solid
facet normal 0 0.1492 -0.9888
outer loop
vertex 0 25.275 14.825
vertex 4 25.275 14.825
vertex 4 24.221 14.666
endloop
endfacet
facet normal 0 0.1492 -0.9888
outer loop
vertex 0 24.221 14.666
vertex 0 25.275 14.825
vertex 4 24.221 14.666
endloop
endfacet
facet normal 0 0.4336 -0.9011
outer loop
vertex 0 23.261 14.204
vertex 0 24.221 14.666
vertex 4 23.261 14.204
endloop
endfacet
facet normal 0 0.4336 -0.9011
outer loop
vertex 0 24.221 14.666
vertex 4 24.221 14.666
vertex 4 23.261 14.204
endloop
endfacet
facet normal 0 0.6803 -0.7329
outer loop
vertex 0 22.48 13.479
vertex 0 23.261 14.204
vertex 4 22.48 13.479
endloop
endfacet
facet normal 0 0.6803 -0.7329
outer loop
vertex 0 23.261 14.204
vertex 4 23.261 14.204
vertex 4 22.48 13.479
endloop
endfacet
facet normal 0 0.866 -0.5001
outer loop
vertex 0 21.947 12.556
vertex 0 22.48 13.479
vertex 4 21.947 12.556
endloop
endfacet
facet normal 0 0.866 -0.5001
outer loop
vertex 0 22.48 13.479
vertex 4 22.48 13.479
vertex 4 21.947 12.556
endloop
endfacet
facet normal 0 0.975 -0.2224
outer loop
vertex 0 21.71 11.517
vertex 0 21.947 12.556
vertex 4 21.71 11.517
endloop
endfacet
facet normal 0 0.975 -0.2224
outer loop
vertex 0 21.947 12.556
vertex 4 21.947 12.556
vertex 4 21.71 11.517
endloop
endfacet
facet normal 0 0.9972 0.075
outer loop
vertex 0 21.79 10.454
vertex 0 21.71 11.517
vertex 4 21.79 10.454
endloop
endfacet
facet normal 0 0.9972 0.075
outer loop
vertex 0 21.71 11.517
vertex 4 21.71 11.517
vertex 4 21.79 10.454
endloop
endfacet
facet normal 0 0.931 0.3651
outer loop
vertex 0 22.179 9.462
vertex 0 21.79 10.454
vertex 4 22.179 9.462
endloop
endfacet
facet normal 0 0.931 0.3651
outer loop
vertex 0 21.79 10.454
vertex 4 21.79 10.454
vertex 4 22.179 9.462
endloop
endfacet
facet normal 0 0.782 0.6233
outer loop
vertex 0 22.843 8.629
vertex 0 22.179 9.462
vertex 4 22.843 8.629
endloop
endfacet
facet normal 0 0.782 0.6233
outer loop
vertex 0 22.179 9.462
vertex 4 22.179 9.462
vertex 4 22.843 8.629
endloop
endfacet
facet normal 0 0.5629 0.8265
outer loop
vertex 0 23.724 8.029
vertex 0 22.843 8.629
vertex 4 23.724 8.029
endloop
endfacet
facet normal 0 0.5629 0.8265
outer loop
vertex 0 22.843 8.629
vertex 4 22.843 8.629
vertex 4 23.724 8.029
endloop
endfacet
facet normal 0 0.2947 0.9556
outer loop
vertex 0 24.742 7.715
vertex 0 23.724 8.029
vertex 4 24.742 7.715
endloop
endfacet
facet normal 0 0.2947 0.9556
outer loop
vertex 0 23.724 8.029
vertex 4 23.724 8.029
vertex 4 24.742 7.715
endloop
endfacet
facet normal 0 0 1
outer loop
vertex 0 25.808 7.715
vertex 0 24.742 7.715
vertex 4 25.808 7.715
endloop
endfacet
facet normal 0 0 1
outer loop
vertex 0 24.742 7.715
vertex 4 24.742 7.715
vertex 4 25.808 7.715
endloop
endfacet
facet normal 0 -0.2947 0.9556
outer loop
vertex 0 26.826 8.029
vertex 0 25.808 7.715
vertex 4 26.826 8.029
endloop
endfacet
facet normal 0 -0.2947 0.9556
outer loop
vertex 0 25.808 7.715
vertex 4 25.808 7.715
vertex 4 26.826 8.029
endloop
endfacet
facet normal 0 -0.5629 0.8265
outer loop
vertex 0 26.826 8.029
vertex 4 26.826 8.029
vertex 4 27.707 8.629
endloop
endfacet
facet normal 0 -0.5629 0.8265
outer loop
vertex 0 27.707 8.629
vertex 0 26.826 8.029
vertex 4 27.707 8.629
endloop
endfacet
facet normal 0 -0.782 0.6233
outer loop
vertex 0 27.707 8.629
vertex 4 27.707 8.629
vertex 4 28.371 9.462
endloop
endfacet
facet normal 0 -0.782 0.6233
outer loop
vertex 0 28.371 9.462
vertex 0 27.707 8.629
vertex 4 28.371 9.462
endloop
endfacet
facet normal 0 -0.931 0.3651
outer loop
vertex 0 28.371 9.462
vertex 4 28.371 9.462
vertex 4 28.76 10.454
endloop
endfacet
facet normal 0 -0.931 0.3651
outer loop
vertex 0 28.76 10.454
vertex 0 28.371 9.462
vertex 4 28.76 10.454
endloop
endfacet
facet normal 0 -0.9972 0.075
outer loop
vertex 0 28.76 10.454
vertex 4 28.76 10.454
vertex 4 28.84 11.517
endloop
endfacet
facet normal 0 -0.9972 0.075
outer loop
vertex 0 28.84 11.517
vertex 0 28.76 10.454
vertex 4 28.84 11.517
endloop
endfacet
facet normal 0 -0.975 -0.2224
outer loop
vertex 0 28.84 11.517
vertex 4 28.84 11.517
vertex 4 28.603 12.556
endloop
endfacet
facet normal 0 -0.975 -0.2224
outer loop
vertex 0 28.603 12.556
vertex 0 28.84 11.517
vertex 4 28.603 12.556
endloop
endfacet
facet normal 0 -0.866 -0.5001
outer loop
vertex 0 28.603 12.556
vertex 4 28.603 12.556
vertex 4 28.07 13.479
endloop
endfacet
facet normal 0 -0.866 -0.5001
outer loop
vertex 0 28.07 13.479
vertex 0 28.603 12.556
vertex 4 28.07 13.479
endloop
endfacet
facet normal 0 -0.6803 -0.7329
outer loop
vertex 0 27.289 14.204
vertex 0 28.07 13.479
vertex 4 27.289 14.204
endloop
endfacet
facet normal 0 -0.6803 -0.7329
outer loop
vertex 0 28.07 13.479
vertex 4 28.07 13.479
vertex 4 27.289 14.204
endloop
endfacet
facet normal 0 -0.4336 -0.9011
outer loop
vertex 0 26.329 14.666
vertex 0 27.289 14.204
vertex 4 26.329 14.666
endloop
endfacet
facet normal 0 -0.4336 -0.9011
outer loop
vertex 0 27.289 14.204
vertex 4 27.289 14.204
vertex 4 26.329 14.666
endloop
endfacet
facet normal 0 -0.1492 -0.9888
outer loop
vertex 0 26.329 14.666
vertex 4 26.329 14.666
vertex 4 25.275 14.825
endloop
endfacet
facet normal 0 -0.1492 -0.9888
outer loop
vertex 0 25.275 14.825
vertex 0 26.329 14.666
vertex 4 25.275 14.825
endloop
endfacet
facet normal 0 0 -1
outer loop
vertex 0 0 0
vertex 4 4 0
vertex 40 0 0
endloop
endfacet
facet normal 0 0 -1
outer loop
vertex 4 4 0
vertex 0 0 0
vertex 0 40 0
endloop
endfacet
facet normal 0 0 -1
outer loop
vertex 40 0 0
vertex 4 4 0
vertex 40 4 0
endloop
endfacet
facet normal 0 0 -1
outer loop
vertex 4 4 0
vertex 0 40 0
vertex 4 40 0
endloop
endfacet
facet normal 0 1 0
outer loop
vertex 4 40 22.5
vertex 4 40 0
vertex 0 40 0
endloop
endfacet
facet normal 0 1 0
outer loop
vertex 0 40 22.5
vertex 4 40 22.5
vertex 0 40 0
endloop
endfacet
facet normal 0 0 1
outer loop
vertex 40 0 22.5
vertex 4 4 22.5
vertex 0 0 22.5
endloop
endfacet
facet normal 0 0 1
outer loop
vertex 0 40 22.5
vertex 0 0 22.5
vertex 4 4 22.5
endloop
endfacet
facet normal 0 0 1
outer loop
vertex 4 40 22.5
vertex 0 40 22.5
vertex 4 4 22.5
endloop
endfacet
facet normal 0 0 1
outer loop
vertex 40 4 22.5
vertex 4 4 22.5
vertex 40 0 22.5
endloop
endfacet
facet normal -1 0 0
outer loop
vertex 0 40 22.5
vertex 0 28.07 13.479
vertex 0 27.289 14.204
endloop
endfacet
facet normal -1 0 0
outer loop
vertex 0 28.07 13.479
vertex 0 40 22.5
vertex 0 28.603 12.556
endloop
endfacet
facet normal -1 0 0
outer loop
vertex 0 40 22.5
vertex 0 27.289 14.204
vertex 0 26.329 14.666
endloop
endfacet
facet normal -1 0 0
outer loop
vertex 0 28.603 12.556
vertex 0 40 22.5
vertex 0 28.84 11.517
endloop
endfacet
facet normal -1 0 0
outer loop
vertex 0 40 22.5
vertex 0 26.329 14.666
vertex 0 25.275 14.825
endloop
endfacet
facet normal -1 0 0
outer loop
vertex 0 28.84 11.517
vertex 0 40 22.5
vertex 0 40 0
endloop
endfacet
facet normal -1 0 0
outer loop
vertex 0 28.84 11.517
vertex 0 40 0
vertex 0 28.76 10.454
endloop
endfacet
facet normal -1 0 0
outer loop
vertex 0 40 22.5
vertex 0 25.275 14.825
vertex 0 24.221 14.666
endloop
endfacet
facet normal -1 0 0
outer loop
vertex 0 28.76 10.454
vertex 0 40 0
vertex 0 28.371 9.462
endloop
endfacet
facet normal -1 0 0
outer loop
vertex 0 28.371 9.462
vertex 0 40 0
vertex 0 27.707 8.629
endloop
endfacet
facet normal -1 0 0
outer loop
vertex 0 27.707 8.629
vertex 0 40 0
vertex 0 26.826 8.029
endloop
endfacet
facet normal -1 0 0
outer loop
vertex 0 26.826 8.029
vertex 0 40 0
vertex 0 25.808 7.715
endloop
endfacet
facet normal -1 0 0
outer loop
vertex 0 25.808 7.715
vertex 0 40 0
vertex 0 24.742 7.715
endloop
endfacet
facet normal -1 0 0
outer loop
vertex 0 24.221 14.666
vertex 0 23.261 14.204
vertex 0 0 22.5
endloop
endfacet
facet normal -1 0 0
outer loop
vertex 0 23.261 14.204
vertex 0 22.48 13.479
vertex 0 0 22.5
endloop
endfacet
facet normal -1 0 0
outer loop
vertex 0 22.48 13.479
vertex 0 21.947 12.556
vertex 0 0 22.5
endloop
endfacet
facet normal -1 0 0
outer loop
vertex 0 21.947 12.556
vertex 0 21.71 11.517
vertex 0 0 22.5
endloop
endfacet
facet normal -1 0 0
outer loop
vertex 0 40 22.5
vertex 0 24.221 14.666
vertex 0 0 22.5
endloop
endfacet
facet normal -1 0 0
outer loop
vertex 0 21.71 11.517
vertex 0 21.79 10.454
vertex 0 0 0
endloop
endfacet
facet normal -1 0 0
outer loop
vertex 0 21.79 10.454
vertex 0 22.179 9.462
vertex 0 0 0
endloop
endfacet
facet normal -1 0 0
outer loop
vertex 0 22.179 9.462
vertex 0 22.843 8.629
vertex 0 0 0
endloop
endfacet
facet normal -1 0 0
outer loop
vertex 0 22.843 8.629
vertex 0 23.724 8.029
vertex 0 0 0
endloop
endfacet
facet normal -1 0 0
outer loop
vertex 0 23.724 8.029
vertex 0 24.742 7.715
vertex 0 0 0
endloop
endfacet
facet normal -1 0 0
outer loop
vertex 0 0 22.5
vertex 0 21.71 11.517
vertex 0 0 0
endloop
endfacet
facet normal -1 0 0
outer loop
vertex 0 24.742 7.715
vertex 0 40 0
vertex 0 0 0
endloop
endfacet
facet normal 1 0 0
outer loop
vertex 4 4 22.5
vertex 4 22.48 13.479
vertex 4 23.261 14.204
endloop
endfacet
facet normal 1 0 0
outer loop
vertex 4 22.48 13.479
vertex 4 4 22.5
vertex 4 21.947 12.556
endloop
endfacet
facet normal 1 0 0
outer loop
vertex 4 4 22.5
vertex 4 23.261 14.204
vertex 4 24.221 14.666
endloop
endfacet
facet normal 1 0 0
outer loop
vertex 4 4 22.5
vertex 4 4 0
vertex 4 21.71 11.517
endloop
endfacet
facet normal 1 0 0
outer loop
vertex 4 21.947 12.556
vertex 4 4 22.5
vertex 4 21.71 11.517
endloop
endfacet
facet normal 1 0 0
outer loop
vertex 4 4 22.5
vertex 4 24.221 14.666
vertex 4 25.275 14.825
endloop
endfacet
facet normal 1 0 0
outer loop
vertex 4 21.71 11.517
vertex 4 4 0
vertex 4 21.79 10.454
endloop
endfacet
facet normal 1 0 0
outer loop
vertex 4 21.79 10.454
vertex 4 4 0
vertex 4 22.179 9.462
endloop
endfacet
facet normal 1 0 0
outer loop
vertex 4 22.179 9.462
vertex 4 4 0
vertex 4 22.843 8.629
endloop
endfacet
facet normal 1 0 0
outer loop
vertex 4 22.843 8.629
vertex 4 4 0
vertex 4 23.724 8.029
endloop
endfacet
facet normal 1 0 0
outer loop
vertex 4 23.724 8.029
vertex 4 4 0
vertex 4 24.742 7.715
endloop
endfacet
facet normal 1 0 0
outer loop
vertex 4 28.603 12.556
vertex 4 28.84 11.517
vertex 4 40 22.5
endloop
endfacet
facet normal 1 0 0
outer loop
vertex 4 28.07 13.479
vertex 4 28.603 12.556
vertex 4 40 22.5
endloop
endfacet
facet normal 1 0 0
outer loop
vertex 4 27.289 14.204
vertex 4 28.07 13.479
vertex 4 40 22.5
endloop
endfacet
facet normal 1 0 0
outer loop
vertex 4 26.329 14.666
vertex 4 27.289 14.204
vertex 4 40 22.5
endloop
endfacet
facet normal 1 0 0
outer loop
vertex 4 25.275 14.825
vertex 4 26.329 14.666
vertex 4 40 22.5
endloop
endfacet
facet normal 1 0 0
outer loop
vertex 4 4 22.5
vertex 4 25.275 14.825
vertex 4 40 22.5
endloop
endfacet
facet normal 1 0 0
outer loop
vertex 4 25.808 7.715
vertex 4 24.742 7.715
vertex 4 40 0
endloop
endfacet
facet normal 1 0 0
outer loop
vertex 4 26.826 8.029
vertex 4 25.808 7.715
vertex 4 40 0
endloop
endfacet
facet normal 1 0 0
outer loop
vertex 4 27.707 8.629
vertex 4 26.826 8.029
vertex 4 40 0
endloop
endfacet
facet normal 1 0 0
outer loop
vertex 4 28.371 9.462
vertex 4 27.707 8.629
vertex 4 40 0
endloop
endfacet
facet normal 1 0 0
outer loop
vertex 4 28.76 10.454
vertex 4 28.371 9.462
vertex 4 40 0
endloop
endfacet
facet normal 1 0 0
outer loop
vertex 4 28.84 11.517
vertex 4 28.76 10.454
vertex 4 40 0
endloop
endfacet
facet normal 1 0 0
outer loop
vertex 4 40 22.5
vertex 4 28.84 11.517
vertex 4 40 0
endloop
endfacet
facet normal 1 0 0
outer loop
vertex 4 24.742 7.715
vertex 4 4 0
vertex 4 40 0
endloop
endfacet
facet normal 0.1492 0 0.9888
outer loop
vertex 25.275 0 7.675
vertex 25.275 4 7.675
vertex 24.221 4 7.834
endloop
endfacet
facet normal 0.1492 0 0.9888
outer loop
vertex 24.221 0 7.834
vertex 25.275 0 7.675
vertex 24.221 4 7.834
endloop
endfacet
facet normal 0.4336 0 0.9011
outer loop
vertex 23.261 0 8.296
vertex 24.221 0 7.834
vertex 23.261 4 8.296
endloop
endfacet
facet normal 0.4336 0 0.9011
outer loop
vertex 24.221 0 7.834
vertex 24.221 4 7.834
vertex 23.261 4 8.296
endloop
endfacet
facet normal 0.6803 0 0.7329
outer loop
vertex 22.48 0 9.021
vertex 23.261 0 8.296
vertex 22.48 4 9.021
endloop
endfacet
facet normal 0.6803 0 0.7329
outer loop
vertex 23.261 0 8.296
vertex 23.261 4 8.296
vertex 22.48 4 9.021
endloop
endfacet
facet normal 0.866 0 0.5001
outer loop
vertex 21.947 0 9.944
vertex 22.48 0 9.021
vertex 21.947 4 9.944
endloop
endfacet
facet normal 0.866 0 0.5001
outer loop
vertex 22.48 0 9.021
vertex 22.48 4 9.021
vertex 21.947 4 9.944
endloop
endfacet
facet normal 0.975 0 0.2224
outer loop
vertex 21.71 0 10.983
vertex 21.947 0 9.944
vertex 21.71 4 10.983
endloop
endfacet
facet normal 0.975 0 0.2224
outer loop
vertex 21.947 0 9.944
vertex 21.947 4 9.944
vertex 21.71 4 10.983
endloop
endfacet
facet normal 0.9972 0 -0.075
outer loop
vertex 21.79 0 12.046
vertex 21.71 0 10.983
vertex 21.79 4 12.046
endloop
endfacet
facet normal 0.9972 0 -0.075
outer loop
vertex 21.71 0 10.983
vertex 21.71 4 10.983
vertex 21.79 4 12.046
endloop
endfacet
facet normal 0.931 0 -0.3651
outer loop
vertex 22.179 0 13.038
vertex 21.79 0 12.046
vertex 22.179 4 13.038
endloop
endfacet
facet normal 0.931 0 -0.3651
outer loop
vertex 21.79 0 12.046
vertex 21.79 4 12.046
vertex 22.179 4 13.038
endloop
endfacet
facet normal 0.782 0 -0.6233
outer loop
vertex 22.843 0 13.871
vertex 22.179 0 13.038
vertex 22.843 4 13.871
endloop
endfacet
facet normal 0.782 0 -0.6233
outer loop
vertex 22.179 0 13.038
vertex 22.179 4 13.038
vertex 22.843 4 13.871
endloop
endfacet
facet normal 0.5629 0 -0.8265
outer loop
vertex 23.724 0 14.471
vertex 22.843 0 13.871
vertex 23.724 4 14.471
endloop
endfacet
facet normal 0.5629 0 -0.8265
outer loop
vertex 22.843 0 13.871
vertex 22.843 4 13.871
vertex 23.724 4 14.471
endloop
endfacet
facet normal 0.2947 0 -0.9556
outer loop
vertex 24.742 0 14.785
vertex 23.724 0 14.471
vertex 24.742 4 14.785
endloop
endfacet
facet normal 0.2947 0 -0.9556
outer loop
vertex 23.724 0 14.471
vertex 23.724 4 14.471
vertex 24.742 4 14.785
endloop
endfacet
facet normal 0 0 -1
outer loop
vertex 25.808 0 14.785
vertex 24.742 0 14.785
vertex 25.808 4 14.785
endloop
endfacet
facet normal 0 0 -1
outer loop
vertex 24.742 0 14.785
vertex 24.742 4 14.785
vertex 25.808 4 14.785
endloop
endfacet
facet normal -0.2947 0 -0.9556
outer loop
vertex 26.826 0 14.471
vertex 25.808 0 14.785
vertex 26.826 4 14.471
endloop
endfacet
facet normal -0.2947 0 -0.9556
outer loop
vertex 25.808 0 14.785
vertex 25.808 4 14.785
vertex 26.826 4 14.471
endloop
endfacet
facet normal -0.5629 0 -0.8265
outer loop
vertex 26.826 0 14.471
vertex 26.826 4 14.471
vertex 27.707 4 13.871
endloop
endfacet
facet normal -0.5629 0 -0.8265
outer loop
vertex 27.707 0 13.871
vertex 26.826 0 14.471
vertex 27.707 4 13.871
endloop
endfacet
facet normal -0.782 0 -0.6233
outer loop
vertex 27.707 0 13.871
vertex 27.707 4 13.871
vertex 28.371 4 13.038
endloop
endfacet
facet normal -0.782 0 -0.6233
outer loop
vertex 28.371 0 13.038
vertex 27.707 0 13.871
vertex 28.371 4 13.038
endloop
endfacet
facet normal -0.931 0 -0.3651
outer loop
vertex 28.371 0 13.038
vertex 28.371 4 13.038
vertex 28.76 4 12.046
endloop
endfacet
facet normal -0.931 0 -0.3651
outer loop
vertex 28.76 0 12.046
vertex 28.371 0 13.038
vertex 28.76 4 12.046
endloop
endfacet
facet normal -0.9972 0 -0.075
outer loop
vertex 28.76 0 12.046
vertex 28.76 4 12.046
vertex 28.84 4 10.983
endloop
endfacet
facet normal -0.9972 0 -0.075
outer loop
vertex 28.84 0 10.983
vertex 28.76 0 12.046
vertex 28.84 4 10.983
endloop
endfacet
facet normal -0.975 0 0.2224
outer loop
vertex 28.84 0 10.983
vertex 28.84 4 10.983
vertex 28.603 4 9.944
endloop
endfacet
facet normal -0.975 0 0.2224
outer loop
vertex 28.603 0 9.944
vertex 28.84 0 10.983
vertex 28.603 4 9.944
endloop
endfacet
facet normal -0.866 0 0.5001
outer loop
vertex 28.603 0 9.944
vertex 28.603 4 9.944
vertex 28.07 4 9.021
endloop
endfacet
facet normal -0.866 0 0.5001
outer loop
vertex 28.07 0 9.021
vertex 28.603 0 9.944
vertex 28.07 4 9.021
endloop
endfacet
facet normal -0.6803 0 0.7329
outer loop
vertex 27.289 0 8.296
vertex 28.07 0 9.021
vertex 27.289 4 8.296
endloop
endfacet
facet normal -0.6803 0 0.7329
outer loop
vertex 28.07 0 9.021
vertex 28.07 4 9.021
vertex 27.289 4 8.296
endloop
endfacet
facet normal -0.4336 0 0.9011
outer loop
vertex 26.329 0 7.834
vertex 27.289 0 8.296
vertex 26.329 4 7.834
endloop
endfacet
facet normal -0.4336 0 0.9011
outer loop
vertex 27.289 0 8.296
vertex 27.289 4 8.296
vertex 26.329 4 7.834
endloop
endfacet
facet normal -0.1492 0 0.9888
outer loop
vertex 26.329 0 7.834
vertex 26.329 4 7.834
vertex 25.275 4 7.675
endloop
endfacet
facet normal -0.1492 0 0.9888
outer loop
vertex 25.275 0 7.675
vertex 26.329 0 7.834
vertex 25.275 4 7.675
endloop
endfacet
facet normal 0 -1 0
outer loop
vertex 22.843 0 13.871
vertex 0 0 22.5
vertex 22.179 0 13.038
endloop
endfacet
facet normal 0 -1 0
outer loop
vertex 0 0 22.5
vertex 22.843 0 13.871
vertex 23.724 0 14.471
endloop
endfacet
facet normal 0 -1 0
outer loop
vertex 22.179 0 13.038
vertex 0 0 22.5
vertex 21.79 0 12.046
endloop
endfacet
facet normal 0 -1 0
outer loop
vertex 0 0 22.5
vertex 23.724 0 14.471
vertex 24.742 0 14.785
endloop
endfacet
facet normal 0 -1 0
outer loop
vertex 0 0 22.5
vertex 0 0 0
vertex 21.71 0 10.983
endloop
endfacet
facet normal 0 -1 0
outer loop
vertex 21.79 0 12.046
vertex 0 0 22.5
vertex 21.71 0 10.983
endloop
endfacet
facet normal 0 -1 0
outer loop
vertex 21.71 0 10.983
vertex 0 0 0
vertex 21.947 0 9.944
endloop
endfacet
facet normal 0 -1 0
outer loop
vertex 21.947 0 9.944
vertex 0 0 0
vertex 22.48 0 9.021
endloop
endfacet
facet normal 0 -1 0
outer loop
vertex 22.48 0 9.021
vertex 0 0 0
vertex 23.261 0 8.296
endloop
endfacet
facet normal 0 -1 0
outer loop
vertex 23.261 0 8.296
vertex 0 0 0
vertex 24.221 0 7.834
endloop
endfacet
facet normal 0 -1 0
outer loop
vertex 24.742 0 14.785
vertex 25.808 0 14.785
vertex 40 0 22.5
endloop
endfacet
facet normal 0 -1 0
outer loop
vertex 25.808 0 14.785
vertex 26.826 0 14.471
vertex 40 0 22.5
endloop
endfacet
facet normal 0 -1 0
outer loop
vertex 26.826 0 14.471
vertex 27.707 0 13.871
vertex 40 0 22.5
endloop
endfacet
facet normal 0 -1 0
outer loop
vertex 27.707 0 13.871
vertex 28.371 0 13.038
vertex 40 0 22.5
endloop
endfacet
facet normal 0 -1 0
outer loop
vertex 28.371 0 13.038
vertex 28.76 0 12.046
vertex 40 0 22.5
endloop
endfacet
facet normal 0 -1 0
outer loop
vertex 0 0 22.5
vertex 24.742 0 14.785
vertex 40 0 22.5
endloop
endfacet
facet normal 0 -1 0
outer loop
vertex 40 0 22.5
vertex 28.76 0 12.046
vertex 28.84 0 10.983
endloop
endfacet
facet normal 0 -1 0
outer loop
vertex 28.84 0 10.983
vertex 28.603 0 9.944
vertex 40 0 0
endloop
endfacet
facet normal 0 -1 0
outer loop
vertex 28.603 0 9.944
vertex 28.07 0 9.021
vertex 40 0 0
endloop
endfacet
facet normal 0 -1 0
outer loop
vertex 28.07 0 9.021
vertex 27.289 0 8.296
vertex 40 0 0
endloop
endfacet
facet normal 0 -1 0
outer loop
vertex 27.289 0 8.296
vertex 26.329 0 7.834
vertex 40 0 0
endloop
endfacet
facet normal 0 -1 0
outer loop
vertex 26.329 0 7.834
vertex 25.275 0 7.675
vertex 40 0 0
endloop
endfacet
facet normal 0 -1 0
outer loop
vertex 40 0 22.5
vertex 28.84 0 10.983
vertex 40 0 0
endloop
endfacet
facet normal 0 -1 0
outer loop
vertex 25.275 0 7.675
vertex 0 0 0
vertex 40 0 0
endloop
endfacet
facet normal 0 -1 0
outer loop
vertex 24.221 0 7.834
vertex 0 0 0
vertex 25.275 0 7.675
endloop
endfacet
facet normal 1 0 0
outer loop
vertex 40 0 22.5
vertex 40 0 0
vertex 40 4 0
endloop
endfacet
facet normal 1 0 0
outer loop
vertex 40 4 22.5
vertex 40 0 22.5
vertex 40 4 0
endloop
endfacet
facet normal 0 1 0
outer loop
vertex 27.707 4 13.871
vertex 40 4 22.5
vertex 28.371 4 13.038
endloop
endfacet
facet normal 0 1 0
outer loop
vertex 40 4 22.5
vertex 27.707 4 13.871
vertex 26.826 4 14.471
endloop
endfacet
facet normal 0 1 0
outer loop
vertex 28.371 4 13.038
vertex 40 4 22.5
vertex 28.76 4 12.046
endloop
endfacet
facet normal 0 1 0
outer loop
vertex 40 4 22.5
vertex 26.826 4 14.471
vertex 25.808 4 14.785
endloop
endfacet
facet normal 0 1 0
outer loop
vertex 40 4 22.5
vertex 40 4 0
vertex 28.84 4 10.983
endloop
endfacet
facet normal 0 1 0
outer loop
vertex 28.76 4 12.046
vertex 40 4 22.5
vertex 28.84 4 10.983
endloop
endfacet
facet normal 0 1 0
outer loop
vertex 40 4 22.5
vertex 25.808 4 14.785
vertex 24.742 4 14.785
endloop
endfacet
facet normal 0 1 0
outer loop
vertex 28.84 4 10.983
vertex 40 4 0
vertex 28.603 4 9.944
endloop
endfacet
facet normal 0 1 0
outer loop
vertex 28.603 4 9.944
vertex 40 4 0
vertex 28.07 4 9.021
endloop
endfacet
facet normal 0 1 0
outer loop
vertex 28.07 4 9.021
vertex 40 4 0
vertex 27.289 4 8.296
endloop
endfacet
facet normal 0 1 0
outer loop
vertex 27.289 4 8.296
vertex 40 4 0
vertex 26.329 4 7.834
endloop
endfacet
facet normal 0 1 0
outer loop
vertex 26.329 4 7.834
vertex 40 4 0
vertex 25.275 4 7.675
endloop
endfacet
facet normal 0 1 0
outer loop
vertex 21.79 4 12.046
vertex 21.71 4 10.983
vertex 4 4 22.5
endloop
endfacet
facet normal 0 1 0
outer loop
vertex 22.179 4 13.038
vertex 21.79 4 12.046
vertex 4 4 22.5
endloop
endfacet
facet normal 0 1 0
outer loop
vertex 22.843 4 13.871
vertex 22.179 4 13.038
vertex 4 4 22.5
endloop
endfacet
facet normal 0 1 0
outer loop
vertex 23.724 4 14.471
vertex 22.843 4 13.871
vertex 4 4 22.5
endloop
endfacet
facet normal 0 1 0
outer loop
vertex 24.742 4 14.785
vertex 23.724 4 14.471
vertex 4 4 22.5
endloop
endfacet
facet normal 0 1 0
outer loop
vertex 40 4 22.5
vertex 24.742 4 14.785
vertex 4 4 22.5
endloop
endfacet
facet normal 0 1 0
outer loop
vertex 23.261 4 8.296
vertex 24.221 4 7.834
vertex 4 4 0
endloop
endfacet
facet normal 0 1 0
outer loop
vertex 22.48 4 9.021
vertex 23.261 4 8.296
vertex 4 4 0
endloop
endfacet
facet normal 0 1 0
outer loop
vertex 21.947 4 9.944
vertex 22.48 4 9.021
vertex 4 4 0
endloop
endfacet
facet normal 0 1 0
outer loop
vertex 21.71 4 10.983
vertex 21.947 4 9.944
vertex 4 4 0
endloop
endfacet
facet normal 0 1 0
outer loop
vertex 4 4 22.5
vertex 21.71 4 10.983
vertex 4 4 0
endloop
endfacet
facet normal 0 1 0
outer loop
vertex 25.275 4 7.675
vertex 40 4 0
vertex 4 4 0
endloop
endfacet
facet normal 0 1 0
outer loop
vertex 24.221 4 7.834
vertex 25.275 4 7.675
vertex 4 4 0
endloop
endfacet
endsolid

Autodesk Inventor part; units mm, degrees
ref_plane "YZ Plane" through (0, 0, 0) normal (1, 0, 0) x (0, 1, 0)
ref_plane "XZ Plane" through (0, 0, 0) normal (0, 1, 0) x (-1, 0, 0)
ref_plane "XY Plane" through (0, 0, 0) normal (0, 0, 1) x (1, 0, 0)
sketch "Sketch2" plane through (0, 0, 0) normal (0, 0, 1) x (1, 0, 0)
  line L0 (0, 0) -> (40, 0)
  line L1 (40, 0) -> (40, 4)
  line L2 (40, 4) -> (0, 4)
  line L3 (0, 4) -> (0, 0)
  line L4 (0, 0) -> (4, 0)
  line L5 (4, 0) -> (4, 40)
  line L6 (4, 40) -> (0, 40)
  line L7 (0, 40) -> (0, 0)
  point P0 (4, 4)
  point P1 (0, 4)
  dimension "d0" = 40
  dimension "d1" = 40
  dimension "d2" = 4
  dimension "d3" = 4
extrude "Extrusion1" add sketch "Sketch2" along normal blind 22.5
sketch "Sketch3" plane through (0, 0, 0) normal (0, -1, 0) x (1, 0, 0)
  circle A0 centre (25.275, 11.25) radius 5.756
  line L0 (0, 22.5) -> (40, 22.5) projected
  line L1 (0, 0) -> (0, 22.5) projected
  dimension "d6" = 11.25
  dimension "d7" = 25.275
sketch "Sketch4" plane through (0, 0, 0) normal (-1, 0, 0) x (0, 0, 1)
  circle A0 centre (11.25, 25.275) radius 7.6084
  line L0 (22.5, 40) -> (22.5, 0) projected
  line L1 (0, 0) -> (22.5, 0) projected
  line L2 (0, 40) -> (22.5, 40) projected
  dimension "d8" = 11.25
  dimension "d9" = 25.275
  dimension "d24" = 14.725
hole "Hole1" at (0, 25.275, 11.25) direction (1, 0, 0) diameter 7.15 depth 5
hole "Hole2" at (25.275, 0, 11.25) direction (0, 1, 0) diameter 7.15 depth 5
properties part number "Lbracket"
